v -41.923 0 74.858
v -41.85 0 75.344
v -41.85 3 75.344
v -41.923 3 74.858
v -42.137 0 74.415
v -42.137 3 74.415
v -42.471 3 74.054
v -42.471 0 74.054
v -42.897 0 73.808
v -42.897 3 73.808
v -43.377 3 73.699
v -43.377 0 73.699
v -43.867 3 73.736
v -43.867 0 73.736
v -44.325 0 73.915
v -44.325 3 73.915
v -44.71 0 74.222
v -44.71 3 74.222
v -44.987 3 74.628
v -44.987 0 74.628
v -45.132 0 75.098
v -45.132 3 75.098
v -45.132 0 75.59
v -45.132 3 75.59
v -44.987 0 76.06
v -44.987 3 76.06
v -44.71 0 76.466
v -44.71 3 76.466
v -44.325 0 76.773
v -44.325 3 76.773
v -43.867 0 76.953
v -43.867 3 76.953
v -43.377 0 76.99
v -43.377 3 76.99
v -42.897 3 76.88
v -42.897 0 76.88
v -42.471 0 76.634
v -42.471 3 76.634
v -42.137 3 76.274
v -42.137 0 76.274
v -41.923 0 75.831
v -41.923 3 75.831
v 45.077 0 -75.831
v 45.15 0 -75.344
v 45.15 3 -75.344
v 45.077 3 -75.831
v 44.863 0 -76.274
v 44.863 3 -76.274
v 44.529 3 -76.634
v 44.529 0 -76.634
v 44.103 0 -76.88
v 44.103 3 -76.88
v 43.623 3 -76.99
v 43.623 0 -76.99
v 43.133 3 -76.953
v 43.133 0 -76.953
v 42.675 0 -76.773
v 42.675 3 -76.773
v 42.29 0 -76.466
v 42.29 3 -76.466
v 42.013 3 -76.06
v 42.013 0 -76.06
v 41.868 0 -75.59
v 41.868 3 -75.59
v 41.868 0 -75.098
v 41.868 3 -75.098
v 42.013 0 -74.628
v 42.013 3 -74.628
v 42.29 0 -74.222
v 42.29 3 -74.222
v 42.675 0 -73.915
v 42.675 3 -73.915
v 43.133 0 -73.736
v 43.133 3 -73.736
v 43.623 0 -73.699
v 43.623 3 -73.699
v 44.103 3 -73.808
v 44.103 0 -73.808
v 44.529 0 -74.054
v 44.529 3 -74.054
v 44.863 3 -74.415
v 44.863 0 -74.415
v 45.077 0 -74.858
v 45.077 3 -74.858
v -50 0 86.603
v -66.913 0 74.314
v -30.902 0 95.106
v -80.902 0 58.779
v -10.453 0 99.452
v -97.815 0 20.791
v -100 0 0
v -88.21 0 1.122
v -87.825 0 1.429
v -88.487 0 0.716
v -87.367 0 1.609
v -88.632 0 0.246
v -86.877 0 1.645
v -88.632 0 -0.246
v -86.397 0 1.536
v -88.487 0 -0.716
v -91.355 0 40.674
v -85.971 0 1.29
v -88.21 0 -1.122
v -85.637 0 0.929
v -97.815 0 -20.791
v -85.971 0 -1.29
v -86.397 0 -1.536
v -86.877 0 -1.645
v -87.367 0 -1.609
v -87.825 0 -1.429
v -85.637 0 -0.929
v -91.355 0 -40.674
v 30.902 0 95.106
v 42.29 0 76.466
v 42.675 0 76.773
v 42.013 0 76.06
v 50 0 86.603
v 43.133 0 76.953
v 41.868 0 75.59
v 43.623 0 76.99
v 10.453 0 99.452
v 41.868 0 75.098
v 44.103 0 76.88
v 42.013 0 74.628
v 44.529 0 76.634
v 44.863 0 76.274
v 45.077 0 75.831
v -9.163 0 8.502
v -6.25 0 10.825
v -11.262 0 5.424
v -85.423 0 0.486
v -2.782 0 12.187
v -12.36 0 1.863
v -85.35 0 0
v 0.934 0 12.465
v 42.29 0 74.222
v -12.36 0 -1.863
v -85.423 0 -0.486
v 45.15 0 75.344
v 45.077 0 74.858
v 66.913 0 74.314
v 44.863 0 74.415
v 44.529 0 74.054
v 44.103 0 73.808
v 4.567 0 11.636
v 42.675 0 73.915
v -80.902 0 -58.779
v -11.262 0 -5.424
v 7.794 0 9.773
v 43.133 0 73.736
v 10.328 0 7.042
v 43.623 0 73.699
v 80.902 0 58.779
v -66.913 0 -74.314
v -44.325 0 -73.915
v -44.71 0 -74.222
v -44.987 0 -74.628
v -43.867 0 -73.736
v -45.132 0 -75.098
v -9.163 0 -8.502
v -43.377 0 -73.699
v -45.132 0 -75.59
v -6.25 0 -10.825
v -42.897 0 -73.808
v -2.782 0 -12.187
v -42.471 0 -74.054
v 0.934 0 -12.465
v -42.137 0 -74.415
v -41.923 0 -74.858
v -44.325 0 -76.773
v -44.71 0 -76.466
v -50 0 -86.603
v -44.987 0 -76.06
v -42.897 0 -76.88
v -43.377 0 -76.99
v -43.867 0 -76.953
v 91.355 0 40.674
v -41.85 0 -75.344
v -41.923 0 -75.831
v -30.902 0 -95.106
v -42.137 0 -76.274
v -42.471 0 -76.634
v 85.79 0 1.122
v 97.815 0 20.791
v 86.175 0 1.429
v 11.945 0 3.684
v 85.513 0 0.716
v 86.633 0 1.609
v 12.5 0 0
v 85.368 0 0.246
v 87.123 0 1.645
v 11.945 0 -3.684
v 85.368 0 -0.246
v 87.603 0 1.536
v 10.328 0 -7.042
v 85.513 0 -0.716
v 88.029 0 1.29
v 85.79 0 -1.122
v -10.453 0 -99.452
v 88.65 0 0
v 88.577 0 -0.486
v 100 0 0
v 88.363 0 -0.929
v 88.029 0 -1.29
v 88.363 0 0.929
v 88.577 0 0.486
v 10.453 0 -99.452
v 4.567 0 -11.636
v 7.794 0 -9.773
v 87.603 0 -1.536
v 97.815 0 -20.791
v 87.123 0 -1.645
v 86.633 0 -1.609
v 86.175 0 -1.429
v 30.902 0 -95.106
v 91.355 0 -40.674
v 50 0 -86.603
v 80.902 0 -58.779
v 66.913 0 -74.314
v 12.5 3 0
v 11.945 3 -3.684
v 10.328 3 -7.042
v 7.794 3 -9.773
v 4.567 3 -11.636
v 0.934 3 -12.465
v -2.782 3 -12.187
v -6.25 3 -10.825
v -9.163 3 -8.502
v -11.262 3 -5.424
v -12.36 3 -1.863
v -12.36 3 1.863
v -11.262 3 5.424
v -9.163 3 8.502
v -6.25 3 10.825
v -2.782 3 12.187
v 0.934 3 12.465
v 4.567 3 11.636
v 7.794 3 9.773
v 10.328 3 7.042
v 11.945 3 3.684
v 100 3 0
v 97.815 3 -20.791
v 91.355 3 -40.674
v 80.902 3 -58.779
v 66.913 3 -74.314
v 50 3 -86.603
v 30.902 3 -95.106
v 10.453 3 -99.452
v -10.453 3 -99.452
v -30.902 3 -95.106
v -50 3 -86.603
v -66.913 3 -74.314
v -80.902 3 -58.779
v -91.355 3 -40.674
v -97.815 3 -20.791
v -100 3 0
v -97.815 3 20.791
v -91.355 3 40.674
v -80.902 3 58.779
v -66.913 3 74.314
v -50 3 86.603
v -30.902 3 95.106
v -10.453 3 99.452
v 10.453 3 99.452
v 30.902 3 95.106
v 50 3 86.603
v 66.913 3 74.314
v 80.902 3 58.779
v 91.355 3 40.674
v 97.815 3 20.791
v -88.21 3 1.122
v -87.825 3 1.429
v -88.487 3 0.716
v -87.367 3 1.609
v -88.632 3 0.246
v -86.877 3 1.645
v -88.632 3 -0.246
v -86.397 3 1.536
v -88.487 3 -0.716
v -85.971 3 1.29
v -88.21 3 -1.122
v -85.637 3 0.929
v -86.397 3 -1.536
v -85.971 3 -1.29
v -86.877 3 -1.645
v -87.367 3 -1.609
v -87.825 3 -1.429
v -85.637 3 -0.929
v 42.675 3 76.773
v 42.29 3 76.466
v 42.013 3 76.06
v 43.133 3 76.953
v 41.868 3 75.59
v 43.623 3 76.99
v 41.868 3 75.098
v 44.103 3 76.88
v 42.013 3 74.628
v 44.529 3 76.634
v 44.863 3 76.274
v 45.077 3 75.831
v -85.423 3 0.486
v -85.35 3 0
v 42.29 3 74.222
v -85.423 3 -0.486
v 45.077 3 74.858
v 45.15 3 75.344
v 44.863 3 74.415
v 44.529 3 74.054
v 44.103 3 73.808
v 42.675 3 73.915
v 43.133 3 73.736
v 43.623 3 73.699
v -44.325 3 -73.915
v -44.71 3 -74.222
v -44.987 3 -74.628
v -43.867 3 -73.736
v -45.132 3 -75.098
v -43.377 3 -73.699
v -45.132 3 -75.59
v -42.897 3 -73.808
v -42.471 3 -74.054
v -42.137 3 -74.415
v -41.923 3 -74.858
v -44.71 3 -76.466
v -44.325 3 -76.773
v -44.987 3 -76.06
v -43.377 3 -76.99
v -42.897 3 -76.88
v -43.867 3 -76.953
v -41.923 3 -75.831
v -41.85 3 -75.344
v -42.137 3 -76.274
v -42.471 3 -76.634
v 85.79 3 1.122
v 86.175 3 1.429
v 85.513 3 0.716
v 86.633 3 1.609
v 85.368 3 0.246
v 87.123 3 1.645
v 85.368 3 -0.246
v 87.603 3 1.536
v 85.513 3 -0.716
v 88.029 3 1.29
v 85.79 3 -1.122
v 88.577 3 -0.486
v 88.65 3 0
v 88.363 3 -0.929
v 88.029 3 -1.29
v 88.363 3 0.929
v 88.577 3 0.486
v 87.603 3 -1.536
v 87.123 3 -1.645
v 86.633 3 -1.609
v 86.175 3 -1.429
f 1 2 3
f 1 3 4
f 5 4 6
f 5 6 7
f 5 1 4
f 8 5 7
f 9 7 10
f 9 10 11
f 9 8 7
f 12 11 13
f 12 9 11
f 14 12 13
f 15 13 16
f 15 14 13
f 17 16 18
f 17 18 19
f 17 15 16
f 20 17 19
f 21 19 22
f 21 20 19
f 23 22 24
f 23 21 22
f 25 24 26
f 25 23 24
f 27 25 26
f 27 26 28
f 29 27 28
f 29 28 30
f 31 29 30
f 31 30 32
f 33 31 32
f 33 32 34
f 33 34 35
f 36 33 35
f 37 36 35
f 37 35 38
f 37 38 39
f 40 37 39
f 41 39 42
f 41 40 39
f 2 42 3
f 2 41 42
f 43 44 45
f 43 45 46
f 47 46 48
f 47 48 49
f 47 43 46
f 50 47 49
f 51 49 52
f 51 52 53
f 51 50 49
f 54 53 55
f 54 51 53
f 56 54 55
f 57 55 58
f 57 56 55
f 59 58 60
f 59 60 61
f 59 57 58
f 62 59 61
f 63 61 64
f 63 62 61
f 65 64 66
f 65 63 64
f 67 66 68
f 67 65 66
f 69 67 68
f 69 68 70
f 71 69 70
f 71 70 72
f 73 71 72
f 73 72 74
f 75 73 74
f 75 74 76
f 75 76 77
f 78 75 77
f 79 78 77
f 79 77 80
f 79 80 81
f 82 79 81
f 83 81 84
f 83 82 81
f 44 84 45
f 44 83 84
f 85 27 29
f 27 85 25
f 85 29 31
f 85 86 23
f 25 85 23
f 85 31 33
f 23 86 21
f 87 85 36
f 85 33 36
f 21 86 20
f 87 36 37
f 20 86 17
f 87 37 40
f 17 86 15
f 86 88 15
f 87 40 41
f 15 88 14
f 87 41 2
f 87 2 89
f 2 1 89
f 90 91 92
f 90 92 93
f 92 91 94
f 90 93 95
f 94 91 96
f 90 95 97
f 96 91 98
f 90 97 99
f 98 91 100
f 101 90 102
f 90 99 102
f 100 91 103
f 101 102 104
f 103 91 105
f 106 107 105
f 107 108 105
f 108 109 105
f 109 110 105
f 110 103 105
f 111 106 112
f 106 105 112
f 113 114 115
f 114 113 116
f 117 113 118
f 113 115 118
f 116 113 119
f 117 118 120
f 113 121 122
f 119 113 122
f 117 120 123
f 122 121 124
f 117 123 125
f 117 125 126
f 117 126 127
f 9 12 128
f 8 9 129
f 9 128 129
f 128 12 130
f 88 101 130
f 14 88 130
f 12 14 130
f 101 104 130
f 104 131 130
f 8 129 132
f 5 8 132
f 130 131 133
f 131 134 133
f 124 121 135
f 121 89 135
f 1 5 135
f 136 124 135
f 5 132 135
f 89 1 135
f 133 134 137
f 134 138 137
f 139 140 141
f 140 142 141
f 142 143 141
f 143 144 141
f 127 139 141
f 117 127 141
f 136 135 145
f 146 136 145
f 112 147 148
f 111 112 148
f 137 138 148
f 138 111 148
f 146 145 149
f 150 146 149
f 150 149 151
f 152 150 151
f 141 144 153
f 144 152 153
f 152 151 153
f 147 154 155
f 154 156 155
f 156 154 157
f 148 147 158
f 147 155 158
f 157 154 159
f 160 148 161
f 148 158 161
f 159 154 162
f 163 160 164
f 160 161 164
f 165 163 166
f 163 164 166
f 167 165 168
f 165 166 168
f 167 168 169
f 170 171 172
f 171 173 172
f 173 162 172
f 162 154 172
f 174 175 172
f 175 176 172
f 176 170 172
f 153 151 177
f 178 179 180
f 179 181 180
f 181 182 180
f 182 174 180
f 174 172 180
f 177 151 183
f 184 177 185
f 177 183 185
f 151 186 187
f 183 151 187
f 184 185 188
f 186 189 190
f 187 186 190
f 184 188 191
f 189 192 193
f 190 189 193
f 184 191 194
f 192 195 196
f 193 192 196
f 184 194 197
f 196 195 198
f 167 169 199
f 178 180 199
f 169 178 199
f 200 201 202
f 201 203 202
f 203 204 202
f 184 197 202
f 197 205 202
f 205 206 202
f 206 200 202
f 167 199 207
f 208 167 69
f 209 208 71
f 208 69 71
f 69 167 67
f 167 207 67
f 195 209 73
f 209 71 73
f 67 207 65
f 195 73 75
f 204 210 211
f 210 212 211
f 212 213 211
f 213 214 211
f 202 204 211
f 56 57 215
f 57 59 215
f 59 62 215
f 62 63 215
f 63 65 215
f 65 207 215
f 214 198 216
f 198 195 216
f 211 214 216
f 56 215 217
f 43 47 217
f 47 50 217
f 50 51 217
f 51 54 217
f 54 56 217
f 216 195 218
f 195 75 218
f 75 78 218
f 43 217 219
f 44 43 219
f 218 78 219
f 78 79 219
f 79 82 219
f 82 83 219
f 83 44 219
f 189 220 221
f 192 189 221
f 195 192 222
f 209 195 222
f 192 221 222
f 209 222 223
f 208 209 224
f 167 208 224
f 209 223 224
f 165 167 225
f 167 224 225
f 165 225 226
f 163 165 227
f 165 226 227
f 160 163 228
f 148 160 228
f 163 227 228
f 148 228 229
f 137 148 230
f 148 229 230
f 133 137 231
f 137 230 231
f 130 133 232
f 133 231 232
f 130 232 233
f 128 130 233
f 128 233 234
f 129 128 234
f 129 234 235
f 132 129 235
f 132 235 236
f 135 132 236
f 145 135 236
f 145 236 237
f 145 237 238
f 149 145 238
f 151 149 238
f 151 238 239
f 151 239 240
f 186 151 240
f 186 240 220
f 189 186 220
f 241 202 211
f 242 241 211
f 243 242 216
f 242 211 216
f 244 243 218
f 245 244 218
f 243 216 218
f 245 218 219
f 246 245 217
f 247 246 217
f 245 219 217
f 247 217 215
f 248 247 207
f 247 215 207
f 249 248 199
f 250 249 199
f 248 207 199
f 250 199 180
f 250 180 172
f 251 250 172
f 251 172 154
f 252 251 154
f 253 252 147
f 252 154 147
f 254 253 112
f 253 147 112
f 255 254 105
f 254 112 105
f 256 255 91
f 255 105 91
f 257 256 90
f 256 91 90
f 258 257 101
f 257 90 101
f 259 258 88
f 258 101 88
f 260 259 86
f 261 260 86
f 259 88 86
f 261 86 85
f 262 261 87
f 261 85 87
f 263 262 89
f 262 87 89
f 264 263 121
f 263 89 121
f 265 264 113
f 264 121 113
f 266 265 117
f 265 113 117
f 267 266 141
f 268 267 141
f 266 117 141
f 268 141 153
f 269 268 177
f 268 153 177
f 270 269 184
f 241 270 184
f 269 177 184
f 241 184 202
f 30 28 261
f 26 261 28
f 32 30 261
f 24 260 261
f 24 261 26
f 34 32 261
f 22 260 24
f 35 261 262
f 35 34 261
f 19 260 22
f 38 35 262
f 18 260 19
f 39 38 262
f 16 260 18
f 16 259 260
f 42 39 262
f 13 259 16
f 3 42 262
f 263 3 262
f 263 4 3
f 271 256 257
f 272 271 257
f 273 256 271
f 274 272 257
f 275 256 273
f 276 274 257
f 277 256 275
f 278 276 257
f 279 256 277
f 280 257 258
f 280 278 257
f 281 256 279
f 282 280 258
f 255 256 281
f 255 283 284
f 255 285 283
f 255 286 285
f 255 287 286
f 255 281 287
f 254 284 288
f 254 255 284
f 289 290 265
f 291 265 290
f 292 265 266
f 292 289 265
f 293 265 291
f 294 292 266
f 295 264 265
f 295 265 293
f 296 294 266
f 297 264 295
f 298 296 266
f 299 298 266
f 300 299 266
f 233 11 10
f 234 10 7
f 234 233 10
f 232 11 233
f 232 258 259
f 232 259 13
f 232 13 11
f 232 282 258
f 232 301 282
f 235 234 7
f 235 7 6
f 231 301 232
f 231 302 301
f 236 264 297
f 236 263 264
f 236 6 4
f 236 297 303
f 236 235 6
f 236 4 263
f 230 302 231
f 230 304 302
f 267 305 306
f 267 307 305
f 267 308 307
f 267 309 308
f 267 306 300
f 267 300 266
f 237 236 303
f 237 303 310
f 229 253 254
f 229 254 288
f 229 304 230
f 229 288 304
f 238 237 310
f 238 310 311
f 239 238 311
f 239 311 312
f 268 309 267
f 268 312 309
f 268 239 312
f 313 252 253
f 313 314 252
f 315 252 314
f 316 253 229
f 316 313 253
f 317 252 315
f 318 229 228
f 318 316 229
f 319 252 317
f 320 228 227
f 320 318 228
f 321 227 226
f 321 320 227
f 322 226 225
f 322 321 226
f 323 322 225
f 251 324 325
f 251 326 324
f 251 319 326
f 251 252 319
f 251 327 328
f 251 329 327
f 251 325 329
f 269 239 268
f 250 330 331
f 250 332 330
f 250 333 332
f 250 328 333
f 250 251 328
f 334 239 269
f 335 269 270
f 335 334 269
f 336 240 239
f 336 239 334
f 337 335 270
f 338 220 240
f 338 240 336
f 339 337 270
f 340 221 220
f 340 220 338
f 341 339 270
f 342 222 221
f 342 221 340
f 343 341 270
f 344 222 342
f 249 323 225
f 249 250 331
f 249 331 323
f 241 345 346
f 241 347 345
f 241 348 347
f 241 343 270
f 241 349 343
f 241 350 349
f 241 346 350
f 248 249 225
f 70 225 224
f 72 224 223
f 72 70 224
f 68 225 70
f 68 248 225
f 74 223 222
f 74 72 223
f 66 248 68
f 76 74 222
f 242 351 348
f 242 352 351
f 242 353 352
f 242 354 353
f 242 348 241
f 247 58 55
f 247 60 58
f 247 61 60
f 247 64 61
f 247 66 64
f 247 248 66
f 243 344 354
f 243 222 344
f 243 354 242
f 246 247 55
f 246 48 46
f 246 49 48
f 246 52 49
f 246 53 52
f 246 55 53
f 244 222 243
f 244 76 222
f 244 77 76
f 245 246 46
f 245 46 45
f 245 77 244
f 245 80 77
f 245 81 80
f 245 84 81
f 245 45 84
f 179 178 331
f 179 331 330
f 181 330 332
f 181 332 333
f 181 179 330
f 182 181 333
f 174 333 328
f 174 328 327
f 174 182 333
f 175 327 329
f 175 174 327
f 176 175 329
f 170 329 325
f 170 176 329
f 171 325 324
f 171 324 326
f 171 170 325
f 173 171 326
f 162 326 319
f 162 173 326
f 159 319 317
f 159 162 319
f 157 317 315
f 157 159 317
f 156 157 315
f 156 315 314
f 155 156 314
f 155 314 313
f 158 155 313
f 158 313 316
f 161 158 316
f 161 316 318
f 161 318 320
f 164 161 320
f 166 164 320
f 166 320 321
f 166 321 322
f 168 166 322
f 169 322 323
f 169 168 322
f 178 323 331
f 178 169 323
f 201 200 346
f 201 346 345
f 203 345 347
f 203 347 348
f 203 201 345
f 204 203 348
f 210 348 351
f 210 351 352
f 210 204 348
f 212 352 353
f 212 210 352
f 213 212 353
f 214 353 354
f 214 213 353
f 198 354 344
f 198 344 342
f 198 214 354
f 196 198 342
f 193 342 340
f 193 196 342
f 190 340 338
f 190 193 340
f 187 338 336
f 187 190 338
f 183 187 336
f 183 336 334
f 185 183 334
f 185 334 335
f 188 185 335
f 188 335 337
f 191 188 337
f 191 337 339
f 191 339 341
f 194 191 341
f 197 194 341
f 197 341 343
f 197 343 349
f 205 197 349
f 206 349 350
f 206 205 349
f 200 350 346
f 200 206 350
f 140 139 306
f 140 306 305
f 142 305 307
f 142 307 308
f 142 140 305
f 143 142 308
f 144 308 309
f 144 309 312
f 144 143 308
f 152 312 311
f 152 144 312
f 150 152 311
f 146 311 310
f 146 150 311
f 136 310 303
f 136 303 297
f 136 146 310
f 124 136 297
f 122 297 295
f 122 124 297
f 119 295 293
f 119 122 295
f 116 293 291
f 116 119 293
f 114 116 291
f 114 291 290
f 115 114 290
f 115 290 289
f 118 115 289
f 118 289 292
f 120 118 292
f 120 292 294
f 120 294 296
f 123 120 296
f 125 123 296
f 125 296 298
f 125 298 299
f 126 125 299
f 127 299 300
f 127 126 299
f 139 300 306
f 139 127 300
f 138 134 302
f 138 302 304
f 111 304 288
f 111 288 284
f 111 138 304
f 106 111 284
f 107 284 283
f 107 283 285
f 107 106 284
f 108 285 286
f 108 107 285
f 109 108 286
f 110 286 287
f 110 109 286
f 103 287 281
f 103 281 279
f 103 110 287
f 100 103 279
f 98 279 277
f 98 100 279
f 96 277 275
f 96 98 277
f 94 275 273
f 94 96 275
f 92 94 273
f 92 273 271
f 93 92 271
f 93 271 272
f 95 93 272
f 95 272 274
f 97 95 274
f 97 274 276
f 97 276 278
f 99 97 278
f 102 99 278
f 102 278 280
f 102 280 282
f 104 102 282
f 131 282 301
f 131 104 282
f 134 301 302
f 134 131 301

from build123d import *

# Parameters (mm, degrees)
SKETCH1_R           = 100
SKETCH1_R_2         = 1.65
BOSS_EXTRUDE1_DEPTH = 3
SKETCH2_R           = 12.5
CUT_EXTRUDE1_DEPTH  = 4


with BuildPart() as part:
    # Sketch1 → Boss-Extrude1 (new body)
    with BuildSketch(Plane(origin=(0, 0, 0), x_dir=(1, 0, 0), z_dir=(0, 1, 0))):
        Circle(SKETCH1_R)
        with Locations((-87, 0)):
            Circle(SKETCH1_R_2, mode=Mode.SUBTRACT)
        with Locations((-43.5, 75.344210129)):
            Circle(SKETCH1_R_2, mode=Mode.SUBTRACT)
        with Locations((43.5, 75.344210129)):
            Circle(SKETCH1_R_2, mode=Mode.SUBTRACT)
        with Locations((87, 0)):
            Circle(SKETCH1_R_2, mode=Mode.SUBTRACT)
        with Locations((43.5, -75.344210129)):
            Circle(SKETCH1_R_2, mode=Mode.SUBTRACT)
        with Locations((-43.5, -75.344210129)):
            Circle(SKETCH1_R_2, mode=Mode.SUBTRACT)
    extrude(amount=BOSS_EXTRUDE1_DEPTH)

    # Sketch2 → Cut-Extrude1 (cut, through all)
    with BuildSketch(Plane(origin=(0, 3, 0), x_dir=(1, 0, 0), z_dir=(0, 1, 0))):
        Circle(SKETCH2_R)
    extrude(amount=-CUT_EXTRUDE1_DEPTH, mode=Mode.SUBTRACT)


solid = part.part
